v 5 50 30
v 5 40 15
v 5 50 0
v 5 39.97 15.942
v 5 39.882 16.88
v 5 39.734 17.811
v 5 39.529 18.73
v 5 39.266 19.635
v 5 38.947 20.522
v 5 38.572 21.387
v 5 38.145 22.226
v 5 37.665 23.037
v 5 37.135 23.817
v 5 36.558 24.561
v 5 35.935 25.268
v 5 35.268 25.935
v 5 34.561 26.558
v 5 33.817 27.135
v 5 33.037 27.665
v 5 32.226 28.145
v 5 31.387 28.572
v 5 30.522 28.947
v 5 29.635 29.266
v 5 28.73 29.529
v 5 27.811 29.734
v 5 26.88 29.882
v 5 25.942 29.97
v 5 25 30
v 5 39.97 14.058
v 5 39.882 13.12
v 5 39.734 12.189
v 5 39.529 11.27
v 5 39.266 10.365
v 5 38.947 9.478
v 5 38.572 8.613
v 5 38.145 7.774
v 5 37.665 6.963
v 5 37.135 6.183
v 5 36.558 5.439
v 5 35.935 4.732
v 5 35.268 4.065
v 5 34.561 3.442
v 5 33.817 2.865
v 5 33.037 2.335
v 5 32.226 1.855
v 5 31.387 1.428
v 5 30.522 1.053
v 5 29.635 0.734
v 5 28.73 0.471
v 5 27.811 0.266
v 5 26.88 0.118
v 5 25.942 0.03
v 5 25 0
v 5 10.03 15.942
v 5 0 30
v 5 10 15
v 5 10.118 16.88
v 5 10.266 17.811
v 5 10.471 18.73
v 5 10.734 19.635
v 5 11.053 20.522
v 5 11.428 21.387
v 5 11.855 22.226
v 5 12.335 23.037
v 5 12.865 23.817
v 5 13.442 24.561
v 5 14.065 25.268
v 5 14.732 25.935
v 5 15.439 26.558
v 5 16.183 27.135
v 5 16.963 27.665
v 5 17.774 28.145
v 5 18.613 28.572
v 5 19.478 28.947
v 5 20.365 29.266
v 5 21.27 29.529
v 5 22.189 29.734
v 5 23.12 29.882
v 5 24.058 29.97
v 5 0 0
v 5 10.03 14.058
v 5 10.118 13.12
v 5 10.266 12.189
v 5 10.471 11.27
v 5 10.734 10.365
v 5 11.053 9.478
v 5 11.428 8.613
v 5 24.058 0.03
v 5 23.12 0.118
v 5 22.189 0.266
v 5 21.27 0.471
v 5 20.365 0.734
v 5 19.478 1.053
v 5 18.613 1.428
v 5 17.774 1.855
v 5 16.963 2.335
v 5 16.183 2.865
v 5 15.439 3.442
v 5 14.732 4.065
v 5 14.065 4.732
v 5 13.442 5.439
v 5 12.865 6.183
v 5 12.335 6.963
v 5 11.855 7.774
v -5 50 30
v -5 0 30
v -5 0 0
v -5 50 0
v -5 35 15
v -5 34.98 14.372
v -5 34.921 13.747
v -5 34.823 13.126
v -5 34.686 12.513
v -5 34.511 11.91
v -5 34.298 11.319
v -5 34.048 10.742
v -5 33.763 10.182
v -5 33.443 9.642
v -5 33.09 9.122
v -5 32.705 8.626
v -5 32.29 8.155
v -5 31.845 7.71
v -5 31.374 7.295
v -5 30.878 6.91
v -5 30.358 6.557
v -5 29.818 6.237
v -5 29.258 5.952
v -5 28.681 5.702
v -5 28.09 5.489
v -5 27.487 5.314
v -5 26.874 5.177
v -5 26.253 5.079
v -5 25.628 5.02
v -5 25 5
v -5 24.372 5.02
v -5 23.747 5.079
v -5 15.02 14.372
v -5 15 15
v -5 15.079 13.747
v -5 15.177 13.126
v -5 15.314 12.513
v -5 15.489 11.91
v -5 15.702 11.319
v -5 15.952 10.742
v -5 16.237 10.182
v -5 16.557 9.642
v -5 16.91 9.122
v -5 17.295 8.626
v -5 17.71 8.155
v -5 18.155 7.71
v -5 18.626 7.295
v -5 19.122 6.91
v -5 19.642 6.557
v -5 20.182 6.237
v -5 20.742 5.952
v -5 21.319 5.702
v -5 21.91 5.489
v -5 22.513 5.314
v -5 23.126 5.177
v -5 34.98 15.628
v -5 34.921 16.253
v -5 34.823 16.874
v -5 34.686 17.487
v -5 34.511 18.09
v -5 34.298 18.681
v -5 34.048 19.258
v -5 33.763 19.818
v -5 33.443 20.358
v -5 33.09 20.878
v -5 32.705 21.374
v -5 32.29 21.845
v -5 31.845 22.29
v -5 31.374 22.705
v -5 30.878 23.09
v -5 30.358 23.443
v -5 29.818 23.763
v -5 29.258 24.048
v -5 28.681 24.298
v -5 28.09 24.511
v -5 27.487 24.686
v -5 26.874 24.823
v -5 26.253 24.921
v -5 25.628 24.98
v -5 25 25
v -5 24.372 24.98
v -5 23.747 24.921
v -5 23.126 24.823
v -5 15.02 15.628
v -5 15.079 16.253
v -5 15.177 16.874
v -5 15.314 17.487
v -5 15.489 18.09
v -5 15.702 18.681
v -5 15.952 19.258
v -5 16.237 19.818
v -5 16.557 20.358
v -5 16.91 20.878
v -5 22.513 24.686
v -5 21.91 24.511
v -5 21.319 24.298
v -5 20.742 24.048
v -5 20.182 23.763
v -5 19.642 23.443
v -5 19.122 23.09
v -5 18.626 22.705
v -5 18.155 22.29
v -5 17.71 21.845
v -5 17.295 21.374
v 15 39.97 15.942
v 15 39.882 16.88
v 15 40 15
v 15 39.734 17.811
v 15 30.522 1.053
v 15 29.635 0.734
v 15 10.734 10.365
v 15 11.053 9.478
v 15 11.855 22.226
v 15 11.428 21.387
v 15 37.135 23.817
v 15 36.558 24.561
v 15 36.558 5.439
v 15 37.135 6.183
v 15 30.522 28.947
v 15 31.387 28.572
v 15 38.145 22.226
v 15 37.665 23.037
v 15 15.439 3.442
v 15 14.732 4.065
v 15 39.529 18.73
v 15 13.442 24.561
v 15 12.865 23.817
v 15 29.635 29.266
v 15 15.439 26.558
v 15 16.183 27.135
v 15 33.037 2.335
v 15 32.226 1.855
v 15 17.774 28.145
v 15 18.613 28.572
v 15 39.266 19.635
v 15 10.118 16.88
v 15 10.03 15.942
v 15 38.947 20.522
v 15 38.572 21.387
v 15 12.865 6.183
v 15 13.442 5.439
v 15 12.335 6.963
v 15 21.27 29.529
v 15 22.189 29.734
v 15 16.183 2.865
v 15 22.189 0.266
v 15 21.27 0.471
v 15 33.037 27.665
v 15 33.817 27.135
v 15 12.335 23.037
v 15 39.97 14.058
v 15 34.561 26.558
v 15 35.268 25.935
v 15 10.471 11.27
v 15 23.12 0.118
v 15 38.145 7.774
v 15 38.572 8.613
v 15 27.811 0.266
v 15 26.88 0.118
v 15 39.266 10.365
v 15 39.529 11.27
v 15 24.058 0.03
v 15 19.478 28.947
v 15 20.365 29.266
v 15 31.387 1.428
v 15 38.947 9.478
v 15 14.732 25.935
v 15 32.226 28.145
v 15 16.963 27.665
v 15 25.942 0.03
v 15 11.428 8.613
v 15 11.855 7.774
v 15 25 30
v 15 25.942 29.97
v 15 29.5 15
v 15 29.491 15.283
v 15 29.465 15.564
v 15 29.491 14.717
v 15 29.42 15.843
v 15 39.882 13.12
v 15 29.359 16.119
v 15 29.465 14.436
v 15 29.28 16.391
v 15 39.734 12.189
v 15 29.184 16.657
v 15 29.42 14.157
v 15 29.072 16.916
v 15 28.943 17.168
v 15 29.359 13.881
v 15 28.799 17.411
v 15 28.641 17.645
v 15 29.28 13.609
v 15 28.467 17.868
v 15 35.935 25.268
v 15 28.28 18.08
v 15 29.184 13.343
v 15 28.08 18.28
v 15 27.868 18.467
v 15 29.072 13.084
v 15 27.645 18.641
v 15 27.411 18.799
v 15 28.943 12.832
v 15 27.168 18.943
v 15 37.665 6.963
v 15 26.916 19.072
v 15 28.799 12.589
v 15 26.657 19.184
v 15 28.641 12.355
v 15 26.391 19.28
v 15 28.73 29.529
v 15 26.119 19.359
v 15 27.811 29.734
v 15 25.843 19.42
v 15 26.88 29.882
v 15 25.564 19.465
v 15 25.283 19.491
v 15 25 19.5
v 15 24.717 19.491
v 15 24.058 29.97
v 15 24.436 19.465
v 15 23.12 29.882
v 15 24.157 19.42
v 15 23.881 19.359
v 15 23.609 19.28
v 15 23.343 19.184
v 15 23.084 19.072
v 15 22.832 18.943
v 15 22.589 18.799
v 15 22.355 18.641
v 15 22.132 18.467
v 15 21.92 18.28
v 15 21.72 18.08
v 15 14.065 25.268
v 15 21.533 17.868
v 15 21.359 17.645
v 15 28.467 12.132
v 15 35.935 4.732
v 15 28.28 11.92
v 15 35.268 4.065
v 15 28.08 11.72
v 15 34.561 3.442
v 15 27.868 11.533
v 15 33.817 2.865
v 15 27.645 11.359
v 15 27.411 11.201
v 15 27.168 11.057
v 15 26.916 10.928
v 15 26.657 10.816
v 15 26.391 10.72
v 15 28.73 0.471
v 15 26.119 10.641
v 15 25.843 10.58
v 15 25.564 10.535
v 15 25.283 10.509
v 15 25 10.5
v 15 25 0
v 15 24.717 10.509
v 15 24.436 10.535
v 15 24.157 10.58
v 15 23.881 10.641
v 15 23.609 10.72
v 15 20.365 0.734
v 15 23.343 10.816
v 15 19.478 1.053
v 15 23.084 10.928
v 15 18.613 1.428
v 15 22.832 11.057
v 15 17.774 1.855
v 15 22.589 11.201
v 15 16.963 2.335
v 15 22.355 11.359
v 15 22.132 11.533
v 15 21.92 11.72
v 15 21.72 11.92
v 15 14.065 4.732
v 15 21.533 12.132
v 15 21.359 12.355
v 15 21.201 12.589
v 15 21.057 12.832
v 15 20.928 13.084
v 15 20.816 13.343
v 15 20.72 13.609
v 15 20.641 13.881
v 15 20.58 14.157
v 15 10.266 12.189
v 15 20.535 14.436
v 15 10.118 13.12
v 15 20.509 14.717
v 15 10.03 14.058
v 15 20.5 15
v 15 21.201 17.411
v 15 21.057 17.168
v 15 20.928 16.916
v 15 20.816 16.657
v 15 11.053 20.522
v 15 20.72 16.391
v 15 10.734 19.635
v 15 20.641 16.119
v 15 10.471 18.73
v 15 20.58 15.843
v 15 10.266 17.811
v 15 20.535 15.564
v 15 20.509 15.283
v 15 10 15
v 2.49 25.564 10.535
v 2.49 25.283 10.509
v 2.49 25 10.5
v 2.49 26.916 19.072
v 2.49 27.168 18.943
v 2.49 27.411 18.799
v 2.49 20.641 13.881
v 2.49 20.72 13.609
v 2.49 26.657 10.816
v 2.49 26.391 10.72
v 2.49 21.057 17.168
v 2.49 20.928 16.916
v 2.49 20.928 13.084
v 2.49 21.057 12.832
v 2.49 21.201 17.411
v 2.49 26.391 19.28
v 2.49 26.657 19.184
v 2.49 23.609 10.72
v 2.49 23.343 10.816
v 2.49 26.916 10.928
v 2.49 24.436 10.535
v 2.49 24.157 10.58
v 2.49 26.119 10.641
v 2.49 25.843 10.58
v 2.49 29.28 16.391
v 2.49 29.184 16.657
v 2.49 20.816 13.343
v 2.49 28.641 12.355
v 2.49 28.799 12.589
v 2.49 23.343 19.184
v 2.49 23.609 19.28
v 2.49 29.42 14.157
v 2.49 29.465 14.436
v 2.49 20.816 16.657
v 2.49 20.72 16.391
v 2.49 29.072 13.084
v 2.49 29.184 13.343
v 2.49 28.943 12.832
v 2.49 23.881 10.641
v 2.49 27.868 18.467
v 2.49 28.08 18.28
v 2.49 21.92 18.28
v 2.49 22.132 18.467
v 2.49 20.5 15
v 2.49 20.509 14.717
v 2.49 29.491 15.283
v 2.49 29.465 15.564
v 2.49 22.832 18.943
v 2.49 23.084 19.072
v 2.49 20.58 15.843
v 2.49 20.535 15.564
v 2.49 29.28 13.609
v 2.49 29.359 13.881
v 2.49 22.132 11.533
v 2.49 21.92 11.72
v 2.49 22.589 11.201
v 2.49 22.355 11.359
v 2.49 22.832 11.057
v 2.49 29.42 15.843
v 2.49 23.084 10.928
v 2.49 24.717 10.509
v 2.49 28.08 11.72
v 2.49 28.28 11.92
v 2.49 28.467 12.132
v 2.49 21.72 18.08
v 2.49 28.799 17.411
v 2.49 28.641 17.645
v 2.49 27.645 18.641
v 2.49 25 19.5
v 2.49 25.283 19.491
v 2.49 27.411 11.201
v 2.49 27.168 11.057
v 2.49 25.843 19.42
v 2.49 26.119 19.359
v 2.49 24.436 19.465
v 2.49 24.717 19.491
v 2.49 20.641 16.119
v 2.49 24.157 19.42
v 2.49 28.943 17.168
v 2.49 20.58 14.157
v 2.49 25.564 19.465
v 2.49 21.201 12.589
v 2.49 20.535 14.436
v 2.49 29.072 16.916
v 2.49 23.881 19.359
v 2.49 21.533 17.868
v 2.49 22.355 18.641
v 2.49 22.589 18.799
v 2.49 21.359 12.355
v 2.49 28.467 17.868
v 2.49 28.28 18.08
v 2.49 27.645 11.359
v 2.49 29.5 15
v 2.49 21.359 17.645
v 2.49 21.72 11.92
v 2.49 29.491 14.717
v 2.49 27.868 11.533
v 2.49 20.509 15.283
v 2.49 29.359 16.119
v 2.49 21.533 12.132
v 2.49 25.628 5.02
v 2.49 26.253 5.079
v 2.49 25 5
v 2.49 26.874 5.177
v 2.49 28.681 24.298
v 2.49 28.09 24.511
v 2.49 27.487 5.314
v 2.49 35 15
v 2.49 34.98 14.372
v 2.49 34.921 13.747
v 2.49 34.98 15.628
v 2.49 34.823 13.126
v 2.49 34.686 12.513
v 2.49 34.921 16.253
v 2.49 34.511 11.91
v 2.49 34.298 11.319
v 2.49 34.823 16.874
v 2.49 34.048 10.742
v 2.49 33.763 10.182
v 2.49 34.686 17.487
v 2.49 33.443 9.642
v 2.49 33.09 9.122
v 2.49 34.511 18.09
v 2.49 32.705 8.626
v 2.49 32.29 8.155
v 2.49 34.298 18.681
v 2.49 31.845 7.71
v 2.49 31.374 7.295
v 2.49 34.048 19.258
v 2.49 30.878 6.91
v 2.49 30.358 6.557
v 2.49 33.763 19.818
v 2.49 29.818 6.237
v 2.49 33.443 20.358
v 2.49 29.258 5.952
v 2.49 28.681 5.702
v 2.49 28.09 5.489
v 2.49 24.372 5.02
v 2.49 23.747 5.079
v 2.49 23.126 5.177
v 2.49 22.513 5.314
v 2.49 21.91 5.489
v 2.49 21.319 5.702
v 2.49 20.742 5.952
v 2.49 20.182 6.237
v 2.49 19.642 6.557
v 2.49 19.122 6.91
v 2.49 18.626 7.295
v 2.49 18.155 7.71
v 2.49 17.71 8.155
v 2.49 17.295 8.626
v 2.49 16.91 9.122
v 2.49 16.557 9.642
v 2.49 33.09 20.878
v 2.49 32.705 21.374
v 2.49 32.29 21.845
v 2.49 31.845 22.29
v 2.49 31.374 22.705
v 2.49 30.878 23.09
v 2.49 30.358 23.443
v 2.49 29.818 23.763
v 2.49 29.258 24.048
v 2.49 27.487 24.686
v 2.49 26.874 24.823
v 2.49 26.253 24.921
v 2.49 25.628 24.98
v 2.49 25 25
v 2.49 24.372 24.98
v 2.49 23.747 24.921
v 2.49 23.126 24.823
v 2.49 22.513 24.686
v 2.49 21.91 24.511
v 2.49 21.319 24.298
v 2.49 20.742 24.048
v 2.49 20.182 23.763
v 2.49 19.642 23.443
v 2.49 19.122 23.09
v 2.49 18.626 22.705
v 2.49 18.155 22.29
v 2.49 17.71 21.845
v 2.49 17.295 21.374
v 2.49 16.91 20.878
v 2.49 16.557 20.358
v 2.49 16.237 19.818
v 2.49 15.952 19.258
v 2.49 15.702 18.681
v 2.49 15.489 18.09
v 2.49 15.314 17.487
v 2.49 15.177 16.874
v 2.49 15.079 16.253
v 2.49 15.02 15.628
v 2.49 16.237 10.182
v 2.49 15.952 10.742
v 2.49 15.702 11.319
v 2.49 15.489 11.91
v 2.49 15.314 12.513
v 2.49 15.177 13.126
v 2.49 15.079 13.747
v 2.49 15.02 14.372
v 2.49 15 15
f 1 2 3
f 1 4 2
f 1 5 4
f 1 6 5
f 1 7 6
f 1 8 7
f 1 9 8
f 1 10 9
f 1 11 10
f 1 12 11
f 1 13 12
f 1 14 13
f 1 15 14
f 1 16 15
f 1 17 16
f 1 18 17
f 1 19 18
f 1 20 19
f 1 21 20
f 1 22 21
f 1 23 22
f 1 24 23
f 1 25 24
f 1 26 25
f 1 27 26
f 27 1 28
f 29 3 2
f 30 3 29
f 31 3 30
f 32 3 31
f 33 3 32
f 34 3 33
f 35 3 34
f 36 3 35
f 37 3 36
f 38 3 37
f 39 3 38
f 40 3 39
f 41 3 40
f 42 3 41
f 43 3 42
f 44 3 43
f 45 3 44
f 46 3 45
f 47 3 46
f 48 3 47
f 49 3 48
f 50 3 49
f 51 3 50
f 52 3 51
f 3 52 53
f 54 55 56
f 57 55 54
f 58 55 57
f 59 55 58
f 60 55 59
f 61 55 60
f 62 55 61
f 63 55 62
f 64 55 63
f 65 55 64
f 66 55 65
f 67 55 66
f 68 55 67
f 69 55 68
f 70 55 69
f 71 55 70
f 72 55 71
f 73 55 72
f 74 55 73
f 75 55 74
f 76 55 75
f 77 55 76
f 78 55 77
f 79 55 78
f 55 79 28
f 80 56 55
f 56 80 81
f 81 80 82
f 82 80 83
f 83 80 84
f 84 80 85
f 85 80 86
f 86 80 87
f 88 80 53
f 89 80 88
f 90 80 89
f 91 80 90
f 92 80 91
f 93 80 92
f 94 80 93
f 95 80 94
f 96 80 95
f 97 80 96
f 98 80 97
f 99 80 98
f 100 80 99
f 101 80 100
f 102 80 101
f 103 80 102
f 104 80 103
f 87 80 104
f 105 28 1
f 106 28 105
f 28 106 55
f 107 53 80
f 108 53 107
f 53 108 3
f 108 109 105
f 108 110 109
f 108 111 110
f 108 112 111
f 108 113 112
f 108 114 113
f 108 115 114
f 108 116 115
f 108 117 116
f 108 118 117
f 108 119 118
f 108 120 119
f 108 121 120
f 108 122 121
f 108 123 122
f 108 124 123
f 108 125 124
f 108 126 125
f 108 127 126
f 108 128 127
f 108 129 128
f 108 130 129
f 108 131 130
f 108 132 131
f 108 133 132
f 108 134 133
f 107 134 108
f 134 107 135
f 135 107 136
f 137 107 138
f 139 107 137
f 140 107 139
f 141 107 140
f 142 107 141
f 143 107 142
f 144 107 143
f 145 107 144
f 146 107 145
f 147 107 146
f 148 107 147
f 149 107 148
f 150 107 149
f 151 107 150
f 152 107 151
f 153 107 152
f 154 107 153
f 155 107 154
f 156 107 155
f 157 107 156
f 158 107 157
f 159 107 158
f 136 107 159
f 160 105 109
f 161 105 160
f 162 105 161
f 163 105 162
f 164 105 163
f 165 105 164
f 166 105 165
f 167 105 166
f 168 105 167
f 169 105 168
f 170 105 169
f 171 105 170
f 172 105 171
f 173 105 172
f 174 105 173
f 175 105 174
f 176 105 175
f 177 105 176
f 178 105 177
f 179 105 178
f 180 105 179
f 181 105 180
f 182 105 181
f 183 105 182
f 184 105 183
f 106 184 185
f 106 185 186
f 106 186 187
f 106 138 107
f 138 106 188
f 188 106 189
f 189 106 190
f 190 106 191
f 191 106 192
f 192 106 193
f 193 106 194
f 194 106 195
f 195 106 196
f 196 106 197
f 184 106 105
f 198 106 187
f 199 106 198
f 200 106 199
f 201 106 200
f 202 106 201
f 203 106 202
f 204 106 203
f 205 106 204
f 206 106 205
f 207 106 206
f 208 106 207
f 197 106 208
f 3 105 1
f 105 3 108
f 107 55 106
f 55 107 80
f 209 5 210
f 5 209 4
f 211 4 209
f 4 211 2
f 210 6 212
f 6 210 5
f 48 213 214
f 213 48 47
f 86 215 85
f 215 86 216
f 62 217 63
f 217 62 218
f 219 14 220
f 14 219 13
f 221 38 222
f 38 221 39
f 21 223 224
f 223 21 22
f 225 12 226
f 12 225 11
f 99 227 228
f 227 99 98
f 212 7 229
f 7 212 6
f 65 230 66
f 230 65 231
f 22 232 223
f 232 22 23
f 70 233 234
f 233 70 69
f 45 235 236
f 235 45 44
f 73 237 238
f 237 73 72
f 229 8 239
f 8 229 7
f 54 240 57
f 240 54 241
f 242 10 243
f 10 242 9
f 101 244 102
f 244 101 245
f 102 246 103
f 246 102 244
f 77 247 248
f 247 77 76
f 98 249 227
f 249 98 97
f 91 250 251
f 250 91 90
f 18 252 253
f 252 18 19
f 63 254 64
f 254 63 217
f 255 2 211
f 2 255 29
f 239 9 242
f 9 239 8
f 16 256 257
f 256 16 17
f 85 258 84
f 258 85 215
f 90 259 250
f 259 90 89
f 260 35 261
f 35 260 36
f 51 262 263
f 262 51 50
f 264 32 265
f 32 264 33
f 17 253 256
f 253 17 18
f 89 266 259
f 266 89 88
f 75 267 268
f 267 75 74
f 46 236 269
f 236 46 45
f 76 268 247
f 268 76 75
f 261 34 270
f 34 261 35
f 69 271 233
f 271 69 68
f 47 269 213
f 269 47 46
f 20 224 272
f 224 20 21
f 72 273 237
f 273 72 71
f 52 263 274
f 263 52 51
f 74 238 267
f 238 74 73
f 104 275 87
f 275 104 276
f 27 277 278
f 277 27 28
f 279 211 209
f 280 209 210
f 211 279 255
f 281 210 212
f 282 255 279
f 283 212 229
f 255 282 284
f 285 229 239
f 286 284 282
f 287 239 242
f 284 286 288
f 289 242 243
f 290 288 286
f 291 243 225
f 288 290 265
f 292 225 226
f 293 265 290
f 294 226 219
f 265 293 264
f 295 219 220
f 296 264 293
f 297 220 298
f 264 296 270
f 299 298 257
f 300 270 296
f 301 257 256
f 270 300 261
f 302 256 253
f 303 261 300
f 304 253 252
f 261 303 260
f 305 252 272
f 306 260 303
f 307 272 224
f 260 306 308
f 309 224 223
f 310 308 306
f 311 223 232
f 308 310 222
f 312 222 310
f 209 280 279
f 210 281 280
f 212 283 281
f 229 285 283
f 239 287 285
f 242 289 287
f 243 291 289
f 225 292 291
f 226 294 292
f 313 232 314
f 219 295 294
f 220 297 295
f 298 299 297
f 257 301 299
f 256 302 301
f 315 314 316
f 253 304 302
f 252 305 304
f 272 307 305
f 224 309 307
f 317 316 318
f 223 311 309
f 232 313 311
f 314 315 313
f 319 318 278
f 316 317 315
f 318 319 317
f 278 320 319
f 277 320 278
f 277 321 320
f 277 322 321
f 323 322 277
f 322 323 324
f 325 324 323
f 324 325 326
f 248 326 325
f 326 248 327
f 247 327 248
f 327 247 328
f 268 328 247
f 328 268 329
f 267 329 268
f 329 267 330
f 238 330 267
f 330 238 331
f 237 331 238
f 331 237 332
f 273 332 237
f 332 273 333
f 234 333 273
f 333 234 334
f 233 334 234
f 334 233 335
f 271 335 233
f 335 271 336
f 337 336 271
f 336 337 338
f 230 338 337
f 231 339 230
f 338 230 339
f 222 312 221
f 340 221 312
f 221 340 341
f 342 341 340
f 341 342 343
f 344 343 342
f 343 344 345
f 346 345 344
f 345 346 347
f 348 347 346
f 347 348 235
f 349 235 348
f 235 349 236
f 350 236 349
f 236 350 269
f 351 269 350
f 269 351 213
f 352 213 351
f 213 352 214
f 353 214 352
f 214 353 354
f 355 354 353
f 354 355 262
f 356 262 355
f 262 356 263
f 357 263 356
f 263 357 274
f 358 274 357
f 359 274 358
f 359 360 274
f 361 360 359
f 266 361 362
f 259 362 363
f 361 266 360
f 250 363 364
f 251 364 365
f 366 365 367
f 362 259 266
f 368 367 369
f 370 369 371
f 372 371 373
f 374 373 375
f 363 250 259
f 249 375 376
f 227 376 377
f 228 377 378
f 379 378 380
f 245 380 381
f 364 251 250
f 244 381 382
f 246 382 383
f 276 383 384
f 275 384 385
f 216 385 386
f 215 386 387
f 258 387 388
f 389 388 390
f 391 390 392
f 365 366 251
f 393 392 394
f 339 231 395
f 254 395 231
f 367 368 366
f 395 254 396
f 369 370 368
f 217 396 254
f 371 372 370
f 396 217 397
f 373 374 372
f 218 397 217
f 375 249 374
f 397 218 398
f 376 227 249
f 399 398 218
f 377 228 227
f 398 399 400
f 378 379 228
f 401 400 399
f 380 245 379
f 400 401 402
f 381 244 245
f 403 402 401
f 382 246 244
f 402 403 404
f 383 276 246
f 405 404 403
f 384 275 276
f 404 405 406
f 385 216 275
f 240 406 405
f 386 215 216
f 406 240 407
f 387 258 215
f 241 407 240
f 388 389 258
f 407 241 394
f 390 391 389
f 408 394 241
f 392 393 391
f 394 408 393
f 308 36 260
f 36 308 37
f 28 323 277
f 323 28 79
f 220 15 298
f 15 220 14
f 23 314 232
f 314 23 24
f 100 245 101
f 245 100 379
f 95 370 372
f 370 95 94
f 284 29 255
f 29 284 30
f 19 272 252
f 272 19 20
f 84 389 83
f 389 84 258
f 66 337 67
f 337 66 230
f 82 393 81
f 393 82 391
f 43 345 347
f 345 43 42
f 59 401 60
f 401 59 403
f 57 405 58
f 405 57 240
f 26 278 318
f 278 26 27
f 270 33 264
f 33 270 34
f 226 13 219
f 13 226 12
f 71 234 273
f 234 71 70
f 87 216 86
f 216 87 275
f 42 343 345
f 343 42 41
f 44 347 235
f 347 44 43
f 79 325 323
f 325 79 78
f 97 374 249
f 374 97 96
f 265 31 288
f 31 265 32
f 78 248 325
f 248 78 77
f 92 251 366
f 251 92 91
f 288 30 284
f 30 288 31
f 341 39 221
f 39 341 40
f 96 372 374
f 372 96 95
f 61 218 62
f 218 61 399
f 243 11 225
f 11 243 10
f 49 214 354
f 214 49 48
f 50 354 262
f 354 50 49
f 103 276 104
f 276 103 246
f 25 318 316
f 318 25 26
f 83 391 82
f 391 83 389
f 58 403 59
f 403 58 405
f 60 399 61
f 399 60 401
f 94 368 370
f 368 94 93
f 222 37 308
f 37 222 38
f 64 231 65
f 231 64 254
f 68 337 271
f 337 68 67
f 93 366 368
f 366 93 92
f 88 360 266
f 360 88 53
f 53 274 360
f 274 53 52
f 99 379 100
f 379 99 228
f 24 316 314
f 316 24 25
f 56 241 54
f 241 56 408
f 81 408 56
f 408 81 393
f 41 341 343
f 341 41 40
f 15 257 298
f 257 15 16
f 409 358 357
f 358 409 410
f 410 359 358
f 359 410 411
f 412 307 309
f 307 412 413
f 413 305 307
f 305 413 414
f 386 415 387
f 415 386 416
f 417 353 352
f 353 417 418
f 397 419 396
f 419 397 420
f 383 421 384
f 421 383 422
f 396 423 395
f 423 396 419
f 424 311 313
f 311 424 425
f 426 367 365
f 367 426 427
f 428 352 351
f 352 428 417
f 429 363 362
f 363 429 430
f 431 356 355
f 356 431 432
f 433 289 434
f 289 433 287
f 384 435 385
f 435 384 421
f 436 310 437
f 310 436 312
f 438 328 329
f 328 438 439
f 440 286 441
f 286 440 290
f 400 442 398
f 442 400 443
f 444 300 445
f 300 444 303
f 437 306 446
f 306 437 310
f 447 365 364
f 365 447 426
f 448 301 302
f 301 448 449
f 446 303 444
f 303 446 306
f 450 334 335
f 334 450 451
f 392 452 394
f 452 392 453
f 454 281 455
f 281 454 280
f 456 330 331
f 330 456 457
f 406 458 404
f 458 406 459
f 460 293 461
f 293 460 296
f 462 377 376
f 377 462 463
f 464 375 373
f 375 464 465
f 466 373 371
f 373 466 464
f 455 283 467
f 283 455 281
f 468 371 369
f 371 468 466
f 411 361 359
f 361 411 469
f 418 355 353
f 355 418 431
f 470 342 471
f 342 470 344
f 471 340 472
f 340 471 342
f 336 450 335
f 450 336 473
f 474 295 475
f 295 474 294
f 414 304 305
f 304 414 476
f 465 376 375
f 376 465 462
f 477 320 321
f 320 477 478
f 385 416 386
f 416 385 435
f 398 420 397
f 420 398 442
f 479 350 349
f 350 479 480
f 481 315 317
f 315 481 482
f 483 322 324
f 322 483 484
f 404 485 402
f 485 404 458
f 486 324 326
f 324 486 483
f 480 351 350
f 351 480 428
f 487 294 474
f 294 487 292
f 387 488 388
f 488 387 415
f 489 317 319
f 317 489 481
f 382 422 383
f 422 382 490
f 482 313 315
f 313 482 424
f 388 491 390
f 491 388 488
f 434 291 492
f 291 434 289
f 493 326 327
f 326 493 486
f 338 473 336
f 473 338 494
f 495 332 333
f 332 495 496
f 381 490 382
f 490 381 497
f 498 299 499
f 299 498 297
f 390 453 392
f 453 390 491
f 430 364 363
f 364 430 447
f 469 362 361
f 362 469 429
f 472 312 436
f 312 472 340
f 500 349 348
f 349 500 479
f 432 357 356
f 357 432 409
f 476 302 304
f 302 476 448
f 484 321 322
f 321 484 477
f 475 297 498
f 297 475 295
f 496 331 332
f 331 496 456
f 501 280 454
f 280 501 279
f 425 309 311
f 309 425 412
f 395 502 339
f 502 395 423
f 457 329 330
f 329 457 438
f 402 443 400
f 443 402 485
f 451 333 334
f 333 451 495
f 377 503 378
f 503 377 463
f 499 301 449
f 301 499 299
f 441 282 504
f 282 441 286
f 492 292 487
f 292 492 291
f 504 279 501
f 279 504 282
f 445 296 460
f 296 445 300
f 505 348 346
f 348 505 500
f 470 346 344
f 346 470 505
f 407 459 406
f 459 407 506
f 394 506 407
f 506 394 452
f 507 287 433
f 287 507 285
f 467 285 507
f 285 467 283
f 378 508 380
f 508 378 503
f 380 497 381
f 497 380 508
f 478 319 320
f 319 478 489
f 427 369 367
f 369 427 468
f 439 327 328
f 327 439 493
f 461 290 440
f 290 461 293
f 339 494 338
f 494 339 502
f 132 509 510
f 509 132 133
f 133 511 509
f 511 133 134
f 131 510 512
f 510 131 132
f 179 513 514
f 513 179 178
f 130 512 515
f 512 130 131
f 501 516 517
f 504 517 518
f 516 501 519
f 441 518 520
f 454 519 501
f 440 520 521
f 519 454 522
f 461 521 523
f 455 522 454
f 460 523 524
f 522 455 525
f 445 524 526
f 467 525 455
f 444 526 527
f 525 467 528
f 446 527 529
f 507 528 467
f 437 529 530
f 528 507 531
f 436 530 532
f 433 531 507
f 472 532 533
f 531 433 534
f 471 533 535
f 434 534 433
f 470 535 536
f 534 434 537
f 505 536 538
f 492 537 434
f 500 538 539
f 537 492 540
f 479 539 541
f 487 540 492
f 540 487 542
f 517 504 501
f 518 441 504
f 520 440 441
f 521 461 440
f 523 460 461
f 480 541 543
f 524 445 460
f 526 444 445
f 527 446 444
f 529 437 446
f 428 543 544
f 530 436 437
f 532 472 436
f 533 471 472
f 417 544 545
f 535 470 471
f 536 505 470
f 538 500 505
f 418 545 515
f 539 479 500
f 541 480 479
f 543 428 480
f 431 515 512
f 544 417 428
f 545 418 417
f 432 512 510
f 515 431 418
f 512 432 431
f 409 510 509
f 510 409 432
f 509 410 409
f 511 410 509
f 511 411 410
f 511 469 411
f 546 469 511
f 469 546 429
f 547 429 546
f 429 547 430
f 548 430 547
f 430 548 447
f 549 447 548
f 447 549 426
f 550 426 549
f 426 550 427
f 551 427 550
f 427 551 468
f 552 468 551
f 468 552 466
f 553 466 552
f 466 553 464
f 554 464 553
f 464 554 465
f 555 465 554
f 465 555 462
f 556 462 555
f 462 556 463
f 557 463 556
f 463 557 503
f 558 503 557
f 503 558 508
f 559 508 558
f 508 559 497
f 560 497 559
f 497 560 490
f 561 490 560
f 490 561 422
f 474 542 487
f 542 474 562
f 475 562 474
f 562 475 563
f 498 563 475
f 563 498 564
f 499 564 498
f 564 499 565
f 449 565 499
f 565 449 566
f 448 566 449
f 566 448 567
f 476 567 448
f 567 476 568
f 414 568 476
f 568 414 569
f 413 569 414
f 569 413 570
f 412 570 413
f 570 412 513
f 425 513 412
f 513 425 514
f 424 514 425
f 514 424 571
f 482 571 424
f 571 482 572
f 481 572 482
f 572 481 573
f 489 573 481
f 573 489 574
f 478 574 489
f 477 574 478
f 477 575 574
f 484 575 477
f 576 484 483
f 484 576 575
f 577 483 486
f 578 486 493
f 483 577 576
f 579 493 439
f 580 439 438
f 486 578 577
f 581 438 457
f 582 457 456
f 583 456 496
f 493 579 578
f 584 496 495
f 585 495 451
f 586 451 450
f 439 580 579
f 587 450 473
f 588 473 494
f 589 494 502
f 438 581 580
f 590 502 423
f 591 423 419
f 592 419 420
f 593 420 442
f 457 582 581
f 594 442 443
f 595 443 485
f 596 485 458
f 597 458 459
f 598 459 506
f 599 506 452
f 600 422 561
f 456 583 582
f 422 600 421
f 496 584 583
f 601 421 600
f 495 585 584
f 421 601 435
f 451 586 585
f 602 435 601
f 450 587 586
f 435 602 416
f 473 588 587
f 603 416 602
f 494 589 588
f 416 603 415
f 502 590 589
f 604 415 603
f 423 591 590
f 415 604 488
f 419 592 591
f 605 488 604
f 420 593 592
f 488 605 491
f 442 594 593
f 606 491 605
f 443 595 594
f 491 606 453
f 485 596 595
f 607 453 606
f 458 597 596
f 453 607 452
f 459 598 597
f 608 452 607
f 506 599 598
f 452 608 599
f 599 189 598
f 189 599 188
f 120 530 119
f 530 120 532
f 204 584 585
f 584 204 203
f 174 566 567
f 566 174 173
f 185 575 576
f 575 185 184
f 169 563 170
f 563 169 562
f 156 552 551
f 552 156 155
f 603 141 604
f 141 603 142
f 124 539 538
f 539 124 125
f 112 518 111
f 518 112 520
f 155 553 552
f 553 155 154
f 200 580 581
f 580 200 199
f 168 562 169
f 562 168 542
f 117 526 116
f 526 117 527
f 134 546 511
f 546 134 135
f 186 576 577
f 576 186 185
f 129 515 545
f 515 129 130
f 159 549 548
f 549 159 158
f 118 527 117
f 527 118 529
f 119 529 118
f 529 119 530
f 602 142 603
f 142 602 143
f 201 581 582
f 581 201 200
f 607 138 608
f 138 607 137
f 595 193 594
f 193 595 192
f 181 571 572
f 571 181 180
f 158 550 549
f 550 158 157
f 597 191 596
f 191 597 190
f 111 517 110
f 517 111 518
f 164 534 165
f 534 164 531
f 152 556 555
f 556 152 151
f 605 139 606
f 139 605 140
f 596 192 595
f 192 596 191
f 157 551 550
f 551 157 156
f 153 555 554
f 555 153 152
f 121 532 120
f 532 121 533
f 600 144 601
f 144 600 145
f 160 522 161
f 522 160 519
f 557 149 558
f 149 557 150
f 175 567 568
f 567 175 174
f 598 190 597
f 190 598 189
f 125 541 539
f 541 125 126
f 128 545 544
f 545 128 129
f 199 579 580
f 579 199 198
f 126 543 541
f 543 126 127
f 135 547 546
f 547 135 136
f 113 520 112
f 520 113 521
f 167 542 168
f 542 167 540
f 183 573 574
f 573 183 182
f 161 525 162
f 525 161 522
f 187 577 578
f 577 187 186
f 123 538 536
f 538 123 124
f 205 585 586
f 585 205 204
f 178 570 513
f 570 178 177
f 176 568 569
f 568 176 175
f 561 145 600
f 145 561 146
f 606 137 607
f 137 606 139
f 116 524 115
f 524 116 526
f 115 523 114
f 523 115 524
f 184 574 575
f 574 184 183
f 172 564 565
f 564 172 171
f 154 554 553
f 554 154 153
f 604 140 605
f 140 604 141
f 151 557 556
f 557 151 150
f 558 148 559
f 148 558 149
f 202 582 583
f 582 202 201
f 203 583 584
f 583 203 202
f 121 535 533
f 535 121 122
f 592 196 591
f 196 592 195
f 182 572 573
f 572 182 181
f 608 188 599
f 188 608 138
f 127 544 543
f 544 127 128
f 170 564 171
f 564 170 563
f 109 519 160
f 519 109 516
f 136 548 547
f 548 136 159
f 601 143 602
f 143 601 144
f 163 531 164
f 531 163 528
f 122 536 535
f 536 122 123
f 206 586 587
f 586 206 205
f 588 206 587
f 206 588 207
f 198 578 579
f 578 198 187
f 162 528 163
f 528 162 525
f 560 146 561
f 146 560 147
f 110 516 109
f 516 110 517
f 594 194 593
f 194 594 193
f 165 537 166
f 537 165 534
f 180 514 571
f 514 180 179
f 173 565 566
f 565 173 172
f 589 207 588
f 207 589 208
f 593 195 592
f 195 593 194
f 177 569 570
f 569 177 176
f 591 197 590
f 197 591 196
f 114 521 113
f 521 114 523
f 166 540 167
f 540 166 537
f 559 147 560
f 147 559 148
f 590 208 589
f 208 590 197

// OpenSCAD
$fn=100;

height = 10;
webbing_thickness = 7.2;
hole_edge = 24;

washer_id = 9;
washer_od = 20;

clip_width = washer_od;
clip_len = 4*webbing_thickness+hole_edge;

retainer_edge = 50;

difference()
{
color("blue")
{
    translate([-height/2, 0, 0])
    {
        cube([height, retainer_edge, 1.5*washer_od], center=false);
    }
    translate([height/2, (retainer_edge-hole_edge)/2, 0])
    {
        //cube([height, hole_edge, 1.5*washer_od], center=false);
    }
    translate([height, retainer_edge/2, (1.5*washer_od)/2])
    {
        rotate([90, 0, 90])
        {
            cylinder(h=height, d = 1.5*washer_od, center=true);
        }
    }
}
color("red") 
{
    translate([-height/2-0.01, retainer_edge/2, 1.5*washer_od/2])
    {
        rotate([0, 90, 0])
        {
            union()
            {
                cylinder(d=washer_id, h=3*height, center=false);
                cylinder(d=washer_od, h=3/4*height, center=false);
            }
        }
    }
}
}




// "Original" one using extrusion
//color("green") {
//translate([0, 100, 0]) 
//{
//difference () {
//linear_extrude(1.5*washer_od) {
//    union() {
//        square([height, retainer_edge],center=true);
//        translate([height, 0, 0]) {
//            square([height, hole_edge],center=true);
//        }
//    }
//}
//}
//}
//color("red") {
//        translate([-height/2, 0, 1.1*washer_od/2]) {
//            rotate([0, 90, 0]) {
//                union()
//                {
//                    cylinder(d=washer_id, h=2*height+0.2, center=false);
//                    cylinder(d=washer_od, h=3*height/4, center=false);
//                }
//            }
//        }
//    }
